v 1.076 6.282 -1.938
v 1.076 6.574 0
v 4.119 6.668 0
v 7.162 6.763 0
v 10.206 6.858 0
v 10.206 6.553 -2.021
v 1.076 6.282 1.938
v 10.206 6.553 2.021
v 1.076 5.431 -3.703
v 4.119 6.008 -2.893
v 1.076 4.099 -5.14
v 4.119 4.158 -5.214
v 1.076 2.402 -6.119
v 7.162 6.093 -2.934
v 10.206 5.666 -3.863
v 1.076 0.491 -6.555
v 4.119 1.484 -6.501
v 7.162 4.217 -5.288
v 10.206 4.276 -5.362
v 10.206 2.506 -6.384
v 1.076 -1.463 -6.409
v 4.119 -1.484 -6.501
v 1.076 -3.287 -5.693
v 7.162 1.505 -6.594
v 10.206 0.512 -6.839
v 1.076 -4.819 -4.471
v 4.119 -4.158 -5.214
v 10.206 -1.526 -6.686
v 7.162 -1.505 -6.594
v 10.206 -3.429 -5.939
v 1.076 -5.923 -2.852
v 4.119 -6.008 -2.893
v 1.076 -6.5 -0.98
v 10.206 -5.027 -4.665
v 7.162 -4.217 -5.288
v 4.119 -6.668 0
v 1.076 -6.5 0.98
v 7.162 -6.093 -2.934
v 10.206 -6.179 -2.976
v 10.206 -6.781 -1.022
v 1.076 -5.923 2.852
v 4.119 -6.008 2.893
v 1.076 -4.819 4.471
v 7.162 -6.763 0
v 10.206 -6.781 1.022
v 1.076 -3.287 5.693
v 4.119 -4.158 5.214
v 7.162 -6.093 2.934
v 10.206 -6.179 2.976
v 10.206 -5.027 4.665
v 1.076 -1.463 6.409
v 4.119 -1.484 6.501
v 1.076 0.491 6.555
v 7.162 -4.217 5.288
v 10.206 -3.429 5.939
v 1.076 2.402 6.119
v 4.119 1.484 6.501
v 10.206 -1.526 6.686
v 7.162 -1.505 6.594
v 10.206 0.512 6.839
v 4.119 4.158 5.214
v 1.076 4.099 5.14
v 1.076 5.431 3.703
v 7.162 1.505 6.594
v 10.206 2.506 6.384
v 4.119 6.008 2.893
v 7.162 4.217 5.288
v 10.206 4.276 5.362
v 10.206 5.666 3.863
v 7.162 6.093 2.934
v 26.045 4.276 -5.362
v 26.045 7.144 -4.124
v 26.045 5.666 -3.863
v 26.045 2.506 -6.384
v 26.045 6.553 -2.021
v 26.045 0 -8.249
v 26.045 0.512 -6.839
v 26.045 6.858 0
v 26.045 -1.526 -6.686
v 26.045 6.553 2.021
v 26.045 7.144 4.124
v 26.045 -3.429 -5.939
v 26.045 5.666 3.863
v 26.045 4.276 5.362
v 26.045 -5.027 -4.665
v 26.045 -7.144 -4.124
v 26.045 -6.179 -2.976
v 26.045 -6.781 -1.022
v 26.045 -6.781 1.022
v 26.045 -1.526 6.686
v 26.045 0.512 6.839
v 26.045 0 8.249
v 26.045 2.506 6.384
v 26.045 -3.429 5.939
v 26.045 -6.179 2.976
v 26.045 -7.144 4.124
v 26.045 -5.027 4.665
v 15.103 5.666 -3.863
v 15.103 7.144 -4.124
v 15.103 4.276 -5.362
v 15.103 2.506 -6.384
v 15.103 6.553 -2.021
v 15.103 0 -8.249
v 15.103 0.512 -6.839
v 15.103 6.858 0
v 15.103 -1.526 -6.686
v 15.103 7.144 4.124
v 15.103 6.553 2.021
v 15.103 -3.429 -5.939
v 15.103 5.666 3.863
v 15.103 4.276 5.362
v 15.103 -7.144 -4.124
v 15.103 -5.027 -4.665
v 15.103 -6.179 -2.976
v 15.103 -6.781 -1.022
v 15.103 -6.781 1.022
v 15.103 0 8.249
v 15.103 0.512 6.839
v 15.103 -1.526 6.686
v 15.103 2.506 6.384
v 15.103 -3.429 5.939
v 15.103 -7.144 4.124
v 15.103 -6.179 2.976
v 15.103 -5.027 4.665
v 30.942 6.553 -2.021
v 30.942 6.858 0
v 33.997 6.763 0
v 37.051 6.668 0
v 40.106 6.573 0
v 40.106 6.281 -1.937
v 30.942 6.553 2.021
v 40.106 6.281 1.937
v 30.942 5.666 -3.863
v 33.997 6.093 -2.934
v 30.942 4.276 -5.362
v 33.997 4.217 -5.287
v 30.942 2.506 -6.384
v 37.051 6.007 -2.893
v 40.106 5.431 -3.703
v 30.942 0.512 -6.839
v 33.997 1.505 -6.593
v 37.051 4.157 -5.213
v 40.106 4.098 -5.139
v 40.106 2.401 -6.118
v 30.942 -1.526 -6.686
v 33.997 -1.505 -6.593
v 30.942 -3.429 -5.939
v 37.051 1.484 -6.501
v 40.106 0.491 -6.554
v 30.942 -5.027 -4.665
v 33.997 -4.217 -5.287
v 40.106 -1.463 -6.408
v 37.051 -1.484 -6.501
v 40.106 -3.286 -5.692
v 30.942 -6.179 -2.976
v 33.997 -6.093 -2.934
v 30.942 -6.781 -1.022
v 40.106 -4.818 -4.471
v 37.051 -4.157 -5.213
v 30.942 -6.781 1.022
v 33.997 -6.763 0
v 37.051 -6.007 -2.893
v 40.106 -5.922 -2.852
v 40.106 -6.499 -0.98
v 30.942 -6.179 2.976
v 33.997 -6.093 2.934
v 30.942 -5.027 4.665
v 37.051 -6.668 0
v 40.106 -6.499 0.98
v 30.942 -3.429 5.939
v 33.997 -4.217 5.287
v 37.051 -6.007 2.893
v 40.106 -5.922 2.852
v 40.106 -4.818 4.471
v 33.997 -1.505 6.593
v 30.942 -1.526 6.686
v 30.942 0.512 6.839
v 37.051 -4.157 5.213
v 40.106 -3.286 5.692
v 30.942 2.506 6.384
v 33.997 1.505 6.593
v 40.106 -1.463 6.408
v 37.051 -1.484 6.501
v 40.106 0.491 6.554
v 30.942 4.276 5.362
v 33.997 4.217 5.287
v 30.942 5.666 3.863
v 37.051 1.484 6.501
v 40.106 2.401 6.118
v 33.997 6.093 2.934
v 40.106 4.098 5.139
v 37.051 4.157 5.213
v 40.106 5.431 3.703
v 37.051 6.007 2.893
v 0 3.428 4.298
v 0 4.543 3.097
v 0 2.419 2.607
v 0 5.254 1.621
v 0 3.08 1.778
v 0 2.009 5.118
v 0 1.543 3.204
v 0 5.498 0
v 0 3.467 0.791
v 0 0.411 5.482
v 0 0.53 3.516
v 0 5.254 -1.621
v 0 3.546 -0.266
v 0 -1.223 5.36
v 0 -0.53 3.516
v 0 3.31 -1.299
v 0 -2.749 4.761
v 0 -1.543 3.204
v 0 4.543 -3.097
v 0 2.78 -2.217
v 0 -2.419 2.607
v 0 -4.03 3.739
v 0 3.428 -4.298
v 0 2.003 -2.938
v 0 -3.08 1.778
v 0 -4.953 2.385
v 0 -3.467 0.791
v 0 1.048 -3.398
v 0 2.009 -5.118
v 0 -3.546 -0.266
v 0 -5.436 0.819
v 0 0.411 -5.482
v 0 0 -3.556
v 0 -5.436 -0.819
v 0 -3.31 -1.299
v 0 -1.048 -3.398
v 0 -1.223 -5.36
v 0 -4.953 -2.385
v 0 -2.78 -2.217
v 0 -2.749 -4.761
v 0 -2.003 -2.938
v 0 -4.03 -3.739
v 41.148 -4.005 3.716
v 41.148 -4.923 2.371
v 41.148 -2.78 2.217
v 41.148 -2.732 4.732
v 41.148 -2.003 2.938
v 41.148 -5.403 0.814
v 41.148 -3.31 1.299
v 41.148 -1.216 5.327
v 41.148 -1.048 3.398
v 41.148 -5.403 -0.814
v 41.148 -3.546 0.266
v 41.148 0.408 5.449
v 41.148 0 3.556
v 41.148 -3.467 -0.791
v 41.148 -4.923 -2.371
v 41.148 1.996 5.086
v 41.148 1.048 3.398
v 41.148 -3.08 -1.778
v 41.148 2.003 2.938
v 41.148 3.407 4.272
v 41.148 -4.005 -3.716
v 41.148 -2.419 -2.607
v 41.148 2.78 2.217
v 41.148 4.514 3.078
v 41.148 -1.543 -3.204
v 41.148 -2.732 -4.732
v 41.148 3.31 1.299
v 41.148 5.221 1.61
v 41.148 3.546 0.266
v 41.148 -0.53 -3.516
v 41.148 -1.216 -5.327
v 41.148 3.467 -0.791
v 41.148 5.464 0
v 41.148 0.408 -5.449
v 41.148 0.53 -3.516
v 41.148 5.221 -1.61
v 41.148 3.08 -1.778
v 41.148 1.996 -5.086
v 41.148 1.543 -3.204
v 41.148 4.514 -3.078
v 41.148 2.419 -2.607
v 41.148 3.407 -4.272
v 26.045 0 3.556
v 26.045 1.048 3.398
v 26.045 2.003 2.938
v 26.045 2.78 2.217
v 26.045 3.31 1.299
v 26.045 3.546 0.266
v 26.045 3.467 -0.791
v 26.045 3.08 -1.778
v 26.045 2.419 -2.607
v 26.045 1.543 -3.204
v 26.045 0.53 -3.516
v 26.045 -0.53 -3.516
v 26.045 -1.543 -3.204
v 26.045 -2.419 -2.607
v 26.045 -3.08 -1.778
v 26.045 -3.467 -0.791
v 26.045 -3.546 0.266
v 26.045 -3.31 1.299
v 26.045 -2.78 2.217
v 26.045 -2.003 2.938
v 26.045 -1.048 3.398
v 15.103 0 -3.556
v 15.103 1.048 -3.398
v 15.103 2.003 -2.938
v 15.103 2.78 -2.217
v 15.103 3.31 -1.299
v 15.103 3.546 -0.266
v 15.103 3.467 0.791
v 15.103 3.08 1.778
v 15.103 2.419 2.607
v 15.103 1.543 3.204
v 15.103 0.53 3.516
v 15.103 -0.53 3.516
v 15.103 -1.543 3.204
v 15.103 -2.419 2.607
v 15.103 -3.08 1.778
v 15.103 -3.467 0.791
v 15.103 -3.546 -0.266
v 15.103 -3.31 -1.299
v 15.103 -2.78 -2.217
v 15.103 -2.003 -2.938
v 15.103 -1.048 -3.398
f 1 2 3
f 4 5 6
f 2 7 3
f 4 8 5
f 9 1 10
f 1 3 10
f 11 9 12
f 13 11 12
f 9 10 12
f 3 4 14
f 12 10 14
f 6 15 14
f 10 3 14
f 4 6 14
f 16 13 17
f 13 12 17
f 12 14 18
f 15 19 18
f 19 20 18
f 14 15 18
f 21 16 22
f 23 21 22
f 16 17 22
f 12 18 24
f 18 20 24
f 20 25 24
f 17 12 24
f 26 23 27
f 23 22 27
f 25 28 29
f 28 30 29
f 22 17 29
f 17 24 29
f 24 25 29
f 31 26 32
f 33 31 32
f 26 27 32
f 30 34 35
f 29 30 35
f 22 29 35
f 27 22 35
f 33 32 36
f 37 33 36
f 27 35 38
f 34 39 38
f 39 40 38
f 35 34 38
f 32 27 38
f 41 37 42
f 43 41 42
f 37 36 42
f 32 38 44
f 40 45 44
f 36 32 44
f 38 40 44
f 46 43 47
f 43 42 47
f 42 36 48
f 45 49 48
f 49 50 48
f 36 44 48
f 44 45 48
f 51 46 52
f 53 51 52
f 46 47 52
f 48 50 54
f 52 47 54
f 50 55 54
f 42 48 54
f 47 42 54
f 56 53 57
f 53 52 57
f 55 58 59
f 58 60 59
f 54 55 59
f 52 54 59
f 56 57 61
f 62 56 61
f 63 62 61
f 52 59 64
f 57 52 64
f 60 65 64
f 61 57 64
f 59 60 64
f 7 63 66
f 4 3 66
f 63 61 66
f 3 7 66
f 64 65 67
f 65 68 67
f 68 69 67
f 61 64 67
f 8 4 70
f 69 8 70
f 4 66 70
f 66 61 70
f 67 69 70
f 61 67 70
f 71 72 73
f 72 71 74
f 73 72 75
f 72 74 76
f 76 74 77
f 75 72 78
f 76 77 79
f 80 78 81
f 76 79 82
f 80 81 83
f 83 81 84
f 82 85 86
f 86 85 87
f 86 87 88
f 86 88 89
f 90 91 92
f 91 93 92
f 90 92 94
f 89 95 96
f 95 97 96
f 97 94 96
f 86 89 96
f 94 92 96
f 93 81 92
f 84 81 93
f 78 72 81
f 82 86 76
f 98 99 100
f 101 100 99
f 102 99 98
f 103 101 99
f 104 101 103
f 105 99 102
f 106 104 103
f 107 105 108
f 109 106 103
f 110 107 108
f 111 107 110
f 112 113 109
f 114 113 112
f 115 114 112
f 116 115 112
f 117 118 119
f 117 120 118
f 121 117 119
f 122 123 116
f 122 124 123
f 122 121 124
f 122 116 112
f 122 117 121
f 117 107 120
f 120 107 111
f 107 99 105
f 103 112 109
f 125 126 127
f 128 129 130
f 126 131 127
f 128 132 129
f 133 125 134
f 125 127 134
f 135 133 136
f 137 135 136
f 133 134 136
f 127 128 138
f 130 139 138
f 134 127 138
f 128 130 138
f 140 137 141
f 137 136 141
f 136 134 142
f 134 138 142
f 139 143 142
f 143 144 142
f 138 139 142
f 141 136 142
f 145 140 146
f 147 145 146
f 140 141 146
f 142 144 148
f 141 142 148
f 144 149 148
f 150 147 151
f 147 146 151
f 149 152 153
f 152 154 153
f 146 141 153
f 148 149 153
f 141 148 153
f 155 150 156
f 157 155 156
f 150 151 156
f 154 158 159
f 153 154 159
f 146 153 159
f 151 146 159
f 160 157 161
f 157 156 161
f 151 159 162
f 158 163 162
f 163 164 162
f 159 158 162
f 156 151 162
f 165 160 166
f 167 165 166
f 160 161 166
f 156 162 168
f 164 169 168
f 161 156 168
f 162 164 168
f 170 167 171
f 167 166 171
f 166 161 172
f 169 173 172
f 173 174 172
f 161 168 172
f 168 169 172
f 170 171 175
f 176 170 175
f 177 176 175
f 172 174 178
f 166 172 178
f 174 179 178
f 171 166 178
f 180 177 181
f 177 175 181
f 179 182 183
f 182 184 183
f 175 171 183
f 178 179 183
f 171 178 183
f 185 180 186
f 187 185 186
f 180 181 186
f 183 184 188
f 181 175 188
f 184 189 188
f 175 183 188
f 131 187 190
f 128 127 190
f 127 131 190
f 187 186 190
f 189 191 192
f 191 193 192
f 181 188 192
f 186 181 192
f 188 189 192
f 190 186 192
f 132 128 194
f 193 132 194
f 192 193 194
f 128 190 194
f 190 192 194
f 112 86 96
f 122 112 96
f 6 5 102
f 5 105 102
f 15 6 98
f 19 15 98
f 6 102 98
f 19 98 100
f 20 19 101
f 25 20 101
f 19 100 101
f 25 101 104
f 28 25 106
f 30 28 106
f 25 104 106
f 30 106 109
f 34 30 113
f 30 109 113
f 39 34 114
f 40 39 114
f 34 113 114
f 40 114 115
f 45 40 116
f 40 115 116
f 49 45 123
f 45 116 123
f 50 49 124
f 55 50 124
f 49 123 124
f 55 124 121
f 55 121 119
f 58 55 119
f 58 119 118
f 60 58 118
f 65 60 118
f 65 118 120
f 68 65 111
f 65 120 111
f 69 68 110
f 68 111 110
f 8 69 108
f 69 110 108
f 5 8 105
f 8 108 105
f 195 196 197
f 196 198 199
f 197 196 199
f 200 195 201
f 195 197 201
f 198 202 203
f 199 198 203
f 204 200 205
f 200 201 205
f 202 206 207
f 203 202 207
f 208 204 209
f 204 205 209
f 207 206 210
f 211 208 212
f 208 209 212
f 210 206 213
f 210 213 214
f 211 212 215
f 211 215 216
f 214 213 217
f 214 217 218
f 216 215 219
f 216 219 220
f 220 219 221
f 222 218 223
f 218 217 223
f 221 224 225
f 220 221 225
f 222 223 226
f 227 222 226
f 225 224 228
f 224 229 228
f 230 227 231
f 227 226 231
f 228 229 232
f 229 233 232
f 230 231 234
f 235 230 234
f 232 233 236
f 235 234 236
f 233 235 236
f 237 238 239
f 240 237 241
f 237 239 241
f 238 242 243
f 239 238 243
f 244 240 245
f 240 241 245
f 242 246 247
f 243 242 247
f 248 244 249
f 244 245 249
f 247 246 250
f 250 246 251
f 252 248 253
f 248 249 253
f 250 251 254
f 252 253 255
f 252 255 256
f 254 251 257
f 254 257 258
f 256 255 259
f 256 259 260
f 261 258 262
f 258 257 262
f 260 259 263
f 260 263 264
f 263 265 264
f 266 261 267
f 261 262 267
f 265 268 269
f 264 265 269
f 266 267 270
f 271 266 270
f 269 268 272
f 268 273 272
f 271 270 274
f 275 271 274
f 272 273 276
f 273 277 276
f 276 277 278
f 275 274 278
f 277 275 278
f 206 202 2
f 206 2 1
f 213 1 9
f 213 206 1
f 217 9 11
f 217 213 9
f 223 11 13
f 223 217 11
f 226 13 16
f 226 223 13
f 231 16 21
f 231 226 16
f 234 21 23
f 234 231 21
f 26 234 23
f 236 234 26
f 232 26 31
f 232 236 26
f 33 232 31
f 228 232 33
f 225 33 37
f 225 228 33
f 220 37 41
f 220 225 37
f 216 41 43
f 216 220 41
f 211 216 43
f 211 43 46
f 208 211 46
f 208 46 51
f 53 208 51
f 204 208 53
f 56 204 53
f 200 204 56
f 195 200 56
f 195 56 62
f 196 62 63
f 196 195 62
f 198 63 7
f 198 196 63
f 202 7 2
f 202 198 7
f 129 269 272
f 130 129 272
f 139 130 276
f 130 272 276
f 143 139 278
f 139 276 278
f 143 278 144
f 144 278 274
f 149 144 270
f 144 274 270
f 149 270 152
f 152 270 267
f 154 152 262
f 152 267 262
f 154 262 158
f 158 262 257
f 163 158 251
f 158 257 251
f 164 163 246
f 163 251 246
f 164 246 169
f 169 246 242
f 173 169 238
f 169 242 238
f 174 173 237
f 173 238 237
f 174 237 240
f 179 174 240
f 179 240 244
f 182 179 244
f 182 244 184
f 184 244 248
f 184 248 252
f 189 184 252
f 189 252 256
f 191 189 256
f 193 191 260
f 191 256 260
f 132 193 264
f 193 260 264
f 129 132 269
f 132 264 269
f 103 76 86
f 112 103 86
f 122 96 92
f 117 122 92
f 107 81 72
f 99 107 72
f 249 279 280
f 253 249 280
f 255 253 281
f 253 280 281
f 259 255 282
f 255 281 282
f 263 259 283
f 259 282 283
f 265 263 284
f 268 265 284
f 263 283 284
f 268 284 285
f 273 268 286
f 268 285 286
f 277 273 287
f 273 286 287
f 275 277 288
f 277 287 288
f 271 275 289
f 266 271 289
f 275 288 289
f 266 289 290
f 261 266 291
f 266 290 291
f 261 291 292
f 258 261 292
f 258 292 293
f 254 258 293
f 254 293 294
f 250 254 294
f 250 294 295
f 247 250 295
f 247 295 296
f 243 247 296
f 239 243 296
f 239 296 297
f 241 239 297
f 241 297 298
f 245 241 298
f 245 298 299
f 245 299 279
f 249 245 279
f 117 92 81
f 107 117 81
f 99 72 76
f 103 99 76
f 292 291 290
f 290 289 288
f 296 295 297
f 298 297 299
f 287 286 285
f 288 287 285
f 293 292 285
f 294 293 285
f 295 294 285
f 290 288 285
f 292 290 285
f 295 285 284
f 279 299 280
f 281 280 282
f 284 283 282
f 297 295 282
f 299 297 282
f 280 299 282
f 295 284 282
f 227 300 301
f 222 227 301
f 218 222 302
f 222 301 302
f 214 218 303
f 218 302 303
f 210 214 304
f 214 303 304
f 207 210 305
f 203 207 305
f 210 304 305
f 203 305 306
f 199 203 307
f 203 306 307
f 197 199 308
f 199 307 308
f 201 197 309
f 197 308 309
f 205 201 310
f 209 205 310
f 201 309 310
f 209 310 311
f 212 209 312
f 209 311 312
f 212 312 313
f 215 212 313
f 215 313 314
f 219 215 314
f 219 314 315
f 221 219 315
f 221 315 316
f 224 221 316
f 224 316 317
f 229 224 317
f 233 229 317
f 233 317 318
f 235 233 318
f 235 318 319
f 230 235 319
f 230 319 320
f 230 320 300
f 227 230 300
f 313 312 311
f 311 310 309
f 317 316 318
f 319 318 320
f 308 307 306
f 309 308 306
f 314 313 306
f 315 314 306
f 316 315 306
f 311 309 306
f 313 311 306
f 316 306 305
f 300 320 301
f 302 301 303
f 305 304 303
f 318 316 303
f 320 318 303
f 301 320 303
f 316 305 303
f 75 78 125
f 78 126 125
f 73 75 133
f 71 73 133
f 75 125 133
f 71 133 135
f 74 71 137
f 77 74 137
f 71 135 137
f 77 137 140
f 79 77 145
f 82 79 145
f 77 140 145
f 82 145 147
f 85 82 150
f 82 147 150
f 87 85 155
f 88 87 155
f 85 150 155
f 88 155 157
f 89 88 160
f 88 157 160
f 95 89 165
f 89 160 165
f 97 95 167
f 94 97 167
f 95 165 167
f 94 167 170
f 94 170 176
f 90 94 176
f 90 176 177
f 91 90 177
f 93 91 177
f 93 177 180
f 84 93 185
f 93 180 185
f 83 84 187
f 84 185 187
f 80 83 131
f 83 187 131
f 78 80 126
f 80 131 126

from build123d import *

# Parameters (mm, degrees)
BOSS_EXTRUDE1_DEPTH         = 10.94232
F_1_4_CLEARANCE_HOLE1_D     = 7.112
F_1_4_CLEARANCE_HOLE1_DEPTH = 15.10284
F_1_4_CLEARANCE_HOLE2_D     = 7.112
F_1_4_CLEARANCE_HOLE2_DEPTH = 15.10284
CHAMFER1_SIZE2              = 1.076433961
CHAMFER1_SIZE               = 1.042413957
CHAMFER1_EDGE_2_SIZE2       = 1.042413957
CHAMFER1_EDGE_2_SIZE        = 1.076433961


with BuildPart() as part:
    # Sketch1 → Boss-Extrude1 (new body)
    with BuildSketch(Plane(origin=(15.10284, 0, 0), x_dir=(0, -1, 0), z_dir=(-1, 0, 0))):
        Polygon((7.14375, -4.124445986), (7.14375, 4.124445986), (0, 8.248891971), (-7.14375, 4.124445986), (-7.14375, -4.124445986), (0, -8.248891971), align=None)
    extrude(amount=-BOSS_EXTRUDE1_DEPTH)

    # Sketch2 → Revolve1 (revolve)
    with BuildSketch(Plane(origin=(0, 0, 0), x_dir=(-1, 0, 0), z_dir=(0, 0, -1))):
        Polygon((-41.148, 6.540243957), (-41.148, 0), (-26.04516, 0), (-26.04516, 6.858), (-30.94228, 6.858), align=None)
    revolve(axis=Axis((41.148, 0, 0), (-1, 0, 0)))

    # Sketch3 → Revolve2 (revolve)
    with BuildSketch(Plane(origin=(0, 0, 0), x_dir=(-1, 0, 0), z_dir=(0, 0, -1))):
        Polygon((-15.10284, 6.858), (-15.10284, 0), (0, 0), (0, 6.540243957), (-10.20572, 6.858), align=None)
    revolve(axis=Axis((15.10284, 0, 0), (-1, 0, 0)))

    # 1/4 Clearance Hole1
    with Locations(Plane(origin=(41.148, 0, 0), x_dir=(0, 0, -1), z_dir=(1, 0, 0))):
        with Locations((0, 0)):
            Hole(F_1_4_CLEARANCE_HOLE1_D / 2, depth=F_1_4_CLEARANCE_HOLE1_DEPTH)

    # 1/4 Clearance Hole2
    with Locations(Plane.ZY):
        with Locations((0, 0)):
            Hole(F_1_4_CLEARANCE_HOLE2_D / 2, depth=F_1_4_CLEARANCE_HOLE2_DEPTH)

    # Chamfer1
    chamfer1_edges = [part.edges().sort_by_distance(p)[0] for p in [
        (41.148, -6.540243957, 0),
    ]]
    chamfer(chamfer1_edges, length=CHAMFER1_SIZE, length2=CHAMFER1_SIZE2)

    # Chamfer1 edge 2
    chamfer1_edge_2_edges = [part.edges().sort_by_distance(p)[0] for p in [
        (0, -6.540243957, 0),
    ]]
    chamfer(chamfer1_edge_2_edges, length=CHAMFER1_EDGE_2_SIZE, length2=CHAMFER1_EDGE_2_SIZE2)


solid = part.part
